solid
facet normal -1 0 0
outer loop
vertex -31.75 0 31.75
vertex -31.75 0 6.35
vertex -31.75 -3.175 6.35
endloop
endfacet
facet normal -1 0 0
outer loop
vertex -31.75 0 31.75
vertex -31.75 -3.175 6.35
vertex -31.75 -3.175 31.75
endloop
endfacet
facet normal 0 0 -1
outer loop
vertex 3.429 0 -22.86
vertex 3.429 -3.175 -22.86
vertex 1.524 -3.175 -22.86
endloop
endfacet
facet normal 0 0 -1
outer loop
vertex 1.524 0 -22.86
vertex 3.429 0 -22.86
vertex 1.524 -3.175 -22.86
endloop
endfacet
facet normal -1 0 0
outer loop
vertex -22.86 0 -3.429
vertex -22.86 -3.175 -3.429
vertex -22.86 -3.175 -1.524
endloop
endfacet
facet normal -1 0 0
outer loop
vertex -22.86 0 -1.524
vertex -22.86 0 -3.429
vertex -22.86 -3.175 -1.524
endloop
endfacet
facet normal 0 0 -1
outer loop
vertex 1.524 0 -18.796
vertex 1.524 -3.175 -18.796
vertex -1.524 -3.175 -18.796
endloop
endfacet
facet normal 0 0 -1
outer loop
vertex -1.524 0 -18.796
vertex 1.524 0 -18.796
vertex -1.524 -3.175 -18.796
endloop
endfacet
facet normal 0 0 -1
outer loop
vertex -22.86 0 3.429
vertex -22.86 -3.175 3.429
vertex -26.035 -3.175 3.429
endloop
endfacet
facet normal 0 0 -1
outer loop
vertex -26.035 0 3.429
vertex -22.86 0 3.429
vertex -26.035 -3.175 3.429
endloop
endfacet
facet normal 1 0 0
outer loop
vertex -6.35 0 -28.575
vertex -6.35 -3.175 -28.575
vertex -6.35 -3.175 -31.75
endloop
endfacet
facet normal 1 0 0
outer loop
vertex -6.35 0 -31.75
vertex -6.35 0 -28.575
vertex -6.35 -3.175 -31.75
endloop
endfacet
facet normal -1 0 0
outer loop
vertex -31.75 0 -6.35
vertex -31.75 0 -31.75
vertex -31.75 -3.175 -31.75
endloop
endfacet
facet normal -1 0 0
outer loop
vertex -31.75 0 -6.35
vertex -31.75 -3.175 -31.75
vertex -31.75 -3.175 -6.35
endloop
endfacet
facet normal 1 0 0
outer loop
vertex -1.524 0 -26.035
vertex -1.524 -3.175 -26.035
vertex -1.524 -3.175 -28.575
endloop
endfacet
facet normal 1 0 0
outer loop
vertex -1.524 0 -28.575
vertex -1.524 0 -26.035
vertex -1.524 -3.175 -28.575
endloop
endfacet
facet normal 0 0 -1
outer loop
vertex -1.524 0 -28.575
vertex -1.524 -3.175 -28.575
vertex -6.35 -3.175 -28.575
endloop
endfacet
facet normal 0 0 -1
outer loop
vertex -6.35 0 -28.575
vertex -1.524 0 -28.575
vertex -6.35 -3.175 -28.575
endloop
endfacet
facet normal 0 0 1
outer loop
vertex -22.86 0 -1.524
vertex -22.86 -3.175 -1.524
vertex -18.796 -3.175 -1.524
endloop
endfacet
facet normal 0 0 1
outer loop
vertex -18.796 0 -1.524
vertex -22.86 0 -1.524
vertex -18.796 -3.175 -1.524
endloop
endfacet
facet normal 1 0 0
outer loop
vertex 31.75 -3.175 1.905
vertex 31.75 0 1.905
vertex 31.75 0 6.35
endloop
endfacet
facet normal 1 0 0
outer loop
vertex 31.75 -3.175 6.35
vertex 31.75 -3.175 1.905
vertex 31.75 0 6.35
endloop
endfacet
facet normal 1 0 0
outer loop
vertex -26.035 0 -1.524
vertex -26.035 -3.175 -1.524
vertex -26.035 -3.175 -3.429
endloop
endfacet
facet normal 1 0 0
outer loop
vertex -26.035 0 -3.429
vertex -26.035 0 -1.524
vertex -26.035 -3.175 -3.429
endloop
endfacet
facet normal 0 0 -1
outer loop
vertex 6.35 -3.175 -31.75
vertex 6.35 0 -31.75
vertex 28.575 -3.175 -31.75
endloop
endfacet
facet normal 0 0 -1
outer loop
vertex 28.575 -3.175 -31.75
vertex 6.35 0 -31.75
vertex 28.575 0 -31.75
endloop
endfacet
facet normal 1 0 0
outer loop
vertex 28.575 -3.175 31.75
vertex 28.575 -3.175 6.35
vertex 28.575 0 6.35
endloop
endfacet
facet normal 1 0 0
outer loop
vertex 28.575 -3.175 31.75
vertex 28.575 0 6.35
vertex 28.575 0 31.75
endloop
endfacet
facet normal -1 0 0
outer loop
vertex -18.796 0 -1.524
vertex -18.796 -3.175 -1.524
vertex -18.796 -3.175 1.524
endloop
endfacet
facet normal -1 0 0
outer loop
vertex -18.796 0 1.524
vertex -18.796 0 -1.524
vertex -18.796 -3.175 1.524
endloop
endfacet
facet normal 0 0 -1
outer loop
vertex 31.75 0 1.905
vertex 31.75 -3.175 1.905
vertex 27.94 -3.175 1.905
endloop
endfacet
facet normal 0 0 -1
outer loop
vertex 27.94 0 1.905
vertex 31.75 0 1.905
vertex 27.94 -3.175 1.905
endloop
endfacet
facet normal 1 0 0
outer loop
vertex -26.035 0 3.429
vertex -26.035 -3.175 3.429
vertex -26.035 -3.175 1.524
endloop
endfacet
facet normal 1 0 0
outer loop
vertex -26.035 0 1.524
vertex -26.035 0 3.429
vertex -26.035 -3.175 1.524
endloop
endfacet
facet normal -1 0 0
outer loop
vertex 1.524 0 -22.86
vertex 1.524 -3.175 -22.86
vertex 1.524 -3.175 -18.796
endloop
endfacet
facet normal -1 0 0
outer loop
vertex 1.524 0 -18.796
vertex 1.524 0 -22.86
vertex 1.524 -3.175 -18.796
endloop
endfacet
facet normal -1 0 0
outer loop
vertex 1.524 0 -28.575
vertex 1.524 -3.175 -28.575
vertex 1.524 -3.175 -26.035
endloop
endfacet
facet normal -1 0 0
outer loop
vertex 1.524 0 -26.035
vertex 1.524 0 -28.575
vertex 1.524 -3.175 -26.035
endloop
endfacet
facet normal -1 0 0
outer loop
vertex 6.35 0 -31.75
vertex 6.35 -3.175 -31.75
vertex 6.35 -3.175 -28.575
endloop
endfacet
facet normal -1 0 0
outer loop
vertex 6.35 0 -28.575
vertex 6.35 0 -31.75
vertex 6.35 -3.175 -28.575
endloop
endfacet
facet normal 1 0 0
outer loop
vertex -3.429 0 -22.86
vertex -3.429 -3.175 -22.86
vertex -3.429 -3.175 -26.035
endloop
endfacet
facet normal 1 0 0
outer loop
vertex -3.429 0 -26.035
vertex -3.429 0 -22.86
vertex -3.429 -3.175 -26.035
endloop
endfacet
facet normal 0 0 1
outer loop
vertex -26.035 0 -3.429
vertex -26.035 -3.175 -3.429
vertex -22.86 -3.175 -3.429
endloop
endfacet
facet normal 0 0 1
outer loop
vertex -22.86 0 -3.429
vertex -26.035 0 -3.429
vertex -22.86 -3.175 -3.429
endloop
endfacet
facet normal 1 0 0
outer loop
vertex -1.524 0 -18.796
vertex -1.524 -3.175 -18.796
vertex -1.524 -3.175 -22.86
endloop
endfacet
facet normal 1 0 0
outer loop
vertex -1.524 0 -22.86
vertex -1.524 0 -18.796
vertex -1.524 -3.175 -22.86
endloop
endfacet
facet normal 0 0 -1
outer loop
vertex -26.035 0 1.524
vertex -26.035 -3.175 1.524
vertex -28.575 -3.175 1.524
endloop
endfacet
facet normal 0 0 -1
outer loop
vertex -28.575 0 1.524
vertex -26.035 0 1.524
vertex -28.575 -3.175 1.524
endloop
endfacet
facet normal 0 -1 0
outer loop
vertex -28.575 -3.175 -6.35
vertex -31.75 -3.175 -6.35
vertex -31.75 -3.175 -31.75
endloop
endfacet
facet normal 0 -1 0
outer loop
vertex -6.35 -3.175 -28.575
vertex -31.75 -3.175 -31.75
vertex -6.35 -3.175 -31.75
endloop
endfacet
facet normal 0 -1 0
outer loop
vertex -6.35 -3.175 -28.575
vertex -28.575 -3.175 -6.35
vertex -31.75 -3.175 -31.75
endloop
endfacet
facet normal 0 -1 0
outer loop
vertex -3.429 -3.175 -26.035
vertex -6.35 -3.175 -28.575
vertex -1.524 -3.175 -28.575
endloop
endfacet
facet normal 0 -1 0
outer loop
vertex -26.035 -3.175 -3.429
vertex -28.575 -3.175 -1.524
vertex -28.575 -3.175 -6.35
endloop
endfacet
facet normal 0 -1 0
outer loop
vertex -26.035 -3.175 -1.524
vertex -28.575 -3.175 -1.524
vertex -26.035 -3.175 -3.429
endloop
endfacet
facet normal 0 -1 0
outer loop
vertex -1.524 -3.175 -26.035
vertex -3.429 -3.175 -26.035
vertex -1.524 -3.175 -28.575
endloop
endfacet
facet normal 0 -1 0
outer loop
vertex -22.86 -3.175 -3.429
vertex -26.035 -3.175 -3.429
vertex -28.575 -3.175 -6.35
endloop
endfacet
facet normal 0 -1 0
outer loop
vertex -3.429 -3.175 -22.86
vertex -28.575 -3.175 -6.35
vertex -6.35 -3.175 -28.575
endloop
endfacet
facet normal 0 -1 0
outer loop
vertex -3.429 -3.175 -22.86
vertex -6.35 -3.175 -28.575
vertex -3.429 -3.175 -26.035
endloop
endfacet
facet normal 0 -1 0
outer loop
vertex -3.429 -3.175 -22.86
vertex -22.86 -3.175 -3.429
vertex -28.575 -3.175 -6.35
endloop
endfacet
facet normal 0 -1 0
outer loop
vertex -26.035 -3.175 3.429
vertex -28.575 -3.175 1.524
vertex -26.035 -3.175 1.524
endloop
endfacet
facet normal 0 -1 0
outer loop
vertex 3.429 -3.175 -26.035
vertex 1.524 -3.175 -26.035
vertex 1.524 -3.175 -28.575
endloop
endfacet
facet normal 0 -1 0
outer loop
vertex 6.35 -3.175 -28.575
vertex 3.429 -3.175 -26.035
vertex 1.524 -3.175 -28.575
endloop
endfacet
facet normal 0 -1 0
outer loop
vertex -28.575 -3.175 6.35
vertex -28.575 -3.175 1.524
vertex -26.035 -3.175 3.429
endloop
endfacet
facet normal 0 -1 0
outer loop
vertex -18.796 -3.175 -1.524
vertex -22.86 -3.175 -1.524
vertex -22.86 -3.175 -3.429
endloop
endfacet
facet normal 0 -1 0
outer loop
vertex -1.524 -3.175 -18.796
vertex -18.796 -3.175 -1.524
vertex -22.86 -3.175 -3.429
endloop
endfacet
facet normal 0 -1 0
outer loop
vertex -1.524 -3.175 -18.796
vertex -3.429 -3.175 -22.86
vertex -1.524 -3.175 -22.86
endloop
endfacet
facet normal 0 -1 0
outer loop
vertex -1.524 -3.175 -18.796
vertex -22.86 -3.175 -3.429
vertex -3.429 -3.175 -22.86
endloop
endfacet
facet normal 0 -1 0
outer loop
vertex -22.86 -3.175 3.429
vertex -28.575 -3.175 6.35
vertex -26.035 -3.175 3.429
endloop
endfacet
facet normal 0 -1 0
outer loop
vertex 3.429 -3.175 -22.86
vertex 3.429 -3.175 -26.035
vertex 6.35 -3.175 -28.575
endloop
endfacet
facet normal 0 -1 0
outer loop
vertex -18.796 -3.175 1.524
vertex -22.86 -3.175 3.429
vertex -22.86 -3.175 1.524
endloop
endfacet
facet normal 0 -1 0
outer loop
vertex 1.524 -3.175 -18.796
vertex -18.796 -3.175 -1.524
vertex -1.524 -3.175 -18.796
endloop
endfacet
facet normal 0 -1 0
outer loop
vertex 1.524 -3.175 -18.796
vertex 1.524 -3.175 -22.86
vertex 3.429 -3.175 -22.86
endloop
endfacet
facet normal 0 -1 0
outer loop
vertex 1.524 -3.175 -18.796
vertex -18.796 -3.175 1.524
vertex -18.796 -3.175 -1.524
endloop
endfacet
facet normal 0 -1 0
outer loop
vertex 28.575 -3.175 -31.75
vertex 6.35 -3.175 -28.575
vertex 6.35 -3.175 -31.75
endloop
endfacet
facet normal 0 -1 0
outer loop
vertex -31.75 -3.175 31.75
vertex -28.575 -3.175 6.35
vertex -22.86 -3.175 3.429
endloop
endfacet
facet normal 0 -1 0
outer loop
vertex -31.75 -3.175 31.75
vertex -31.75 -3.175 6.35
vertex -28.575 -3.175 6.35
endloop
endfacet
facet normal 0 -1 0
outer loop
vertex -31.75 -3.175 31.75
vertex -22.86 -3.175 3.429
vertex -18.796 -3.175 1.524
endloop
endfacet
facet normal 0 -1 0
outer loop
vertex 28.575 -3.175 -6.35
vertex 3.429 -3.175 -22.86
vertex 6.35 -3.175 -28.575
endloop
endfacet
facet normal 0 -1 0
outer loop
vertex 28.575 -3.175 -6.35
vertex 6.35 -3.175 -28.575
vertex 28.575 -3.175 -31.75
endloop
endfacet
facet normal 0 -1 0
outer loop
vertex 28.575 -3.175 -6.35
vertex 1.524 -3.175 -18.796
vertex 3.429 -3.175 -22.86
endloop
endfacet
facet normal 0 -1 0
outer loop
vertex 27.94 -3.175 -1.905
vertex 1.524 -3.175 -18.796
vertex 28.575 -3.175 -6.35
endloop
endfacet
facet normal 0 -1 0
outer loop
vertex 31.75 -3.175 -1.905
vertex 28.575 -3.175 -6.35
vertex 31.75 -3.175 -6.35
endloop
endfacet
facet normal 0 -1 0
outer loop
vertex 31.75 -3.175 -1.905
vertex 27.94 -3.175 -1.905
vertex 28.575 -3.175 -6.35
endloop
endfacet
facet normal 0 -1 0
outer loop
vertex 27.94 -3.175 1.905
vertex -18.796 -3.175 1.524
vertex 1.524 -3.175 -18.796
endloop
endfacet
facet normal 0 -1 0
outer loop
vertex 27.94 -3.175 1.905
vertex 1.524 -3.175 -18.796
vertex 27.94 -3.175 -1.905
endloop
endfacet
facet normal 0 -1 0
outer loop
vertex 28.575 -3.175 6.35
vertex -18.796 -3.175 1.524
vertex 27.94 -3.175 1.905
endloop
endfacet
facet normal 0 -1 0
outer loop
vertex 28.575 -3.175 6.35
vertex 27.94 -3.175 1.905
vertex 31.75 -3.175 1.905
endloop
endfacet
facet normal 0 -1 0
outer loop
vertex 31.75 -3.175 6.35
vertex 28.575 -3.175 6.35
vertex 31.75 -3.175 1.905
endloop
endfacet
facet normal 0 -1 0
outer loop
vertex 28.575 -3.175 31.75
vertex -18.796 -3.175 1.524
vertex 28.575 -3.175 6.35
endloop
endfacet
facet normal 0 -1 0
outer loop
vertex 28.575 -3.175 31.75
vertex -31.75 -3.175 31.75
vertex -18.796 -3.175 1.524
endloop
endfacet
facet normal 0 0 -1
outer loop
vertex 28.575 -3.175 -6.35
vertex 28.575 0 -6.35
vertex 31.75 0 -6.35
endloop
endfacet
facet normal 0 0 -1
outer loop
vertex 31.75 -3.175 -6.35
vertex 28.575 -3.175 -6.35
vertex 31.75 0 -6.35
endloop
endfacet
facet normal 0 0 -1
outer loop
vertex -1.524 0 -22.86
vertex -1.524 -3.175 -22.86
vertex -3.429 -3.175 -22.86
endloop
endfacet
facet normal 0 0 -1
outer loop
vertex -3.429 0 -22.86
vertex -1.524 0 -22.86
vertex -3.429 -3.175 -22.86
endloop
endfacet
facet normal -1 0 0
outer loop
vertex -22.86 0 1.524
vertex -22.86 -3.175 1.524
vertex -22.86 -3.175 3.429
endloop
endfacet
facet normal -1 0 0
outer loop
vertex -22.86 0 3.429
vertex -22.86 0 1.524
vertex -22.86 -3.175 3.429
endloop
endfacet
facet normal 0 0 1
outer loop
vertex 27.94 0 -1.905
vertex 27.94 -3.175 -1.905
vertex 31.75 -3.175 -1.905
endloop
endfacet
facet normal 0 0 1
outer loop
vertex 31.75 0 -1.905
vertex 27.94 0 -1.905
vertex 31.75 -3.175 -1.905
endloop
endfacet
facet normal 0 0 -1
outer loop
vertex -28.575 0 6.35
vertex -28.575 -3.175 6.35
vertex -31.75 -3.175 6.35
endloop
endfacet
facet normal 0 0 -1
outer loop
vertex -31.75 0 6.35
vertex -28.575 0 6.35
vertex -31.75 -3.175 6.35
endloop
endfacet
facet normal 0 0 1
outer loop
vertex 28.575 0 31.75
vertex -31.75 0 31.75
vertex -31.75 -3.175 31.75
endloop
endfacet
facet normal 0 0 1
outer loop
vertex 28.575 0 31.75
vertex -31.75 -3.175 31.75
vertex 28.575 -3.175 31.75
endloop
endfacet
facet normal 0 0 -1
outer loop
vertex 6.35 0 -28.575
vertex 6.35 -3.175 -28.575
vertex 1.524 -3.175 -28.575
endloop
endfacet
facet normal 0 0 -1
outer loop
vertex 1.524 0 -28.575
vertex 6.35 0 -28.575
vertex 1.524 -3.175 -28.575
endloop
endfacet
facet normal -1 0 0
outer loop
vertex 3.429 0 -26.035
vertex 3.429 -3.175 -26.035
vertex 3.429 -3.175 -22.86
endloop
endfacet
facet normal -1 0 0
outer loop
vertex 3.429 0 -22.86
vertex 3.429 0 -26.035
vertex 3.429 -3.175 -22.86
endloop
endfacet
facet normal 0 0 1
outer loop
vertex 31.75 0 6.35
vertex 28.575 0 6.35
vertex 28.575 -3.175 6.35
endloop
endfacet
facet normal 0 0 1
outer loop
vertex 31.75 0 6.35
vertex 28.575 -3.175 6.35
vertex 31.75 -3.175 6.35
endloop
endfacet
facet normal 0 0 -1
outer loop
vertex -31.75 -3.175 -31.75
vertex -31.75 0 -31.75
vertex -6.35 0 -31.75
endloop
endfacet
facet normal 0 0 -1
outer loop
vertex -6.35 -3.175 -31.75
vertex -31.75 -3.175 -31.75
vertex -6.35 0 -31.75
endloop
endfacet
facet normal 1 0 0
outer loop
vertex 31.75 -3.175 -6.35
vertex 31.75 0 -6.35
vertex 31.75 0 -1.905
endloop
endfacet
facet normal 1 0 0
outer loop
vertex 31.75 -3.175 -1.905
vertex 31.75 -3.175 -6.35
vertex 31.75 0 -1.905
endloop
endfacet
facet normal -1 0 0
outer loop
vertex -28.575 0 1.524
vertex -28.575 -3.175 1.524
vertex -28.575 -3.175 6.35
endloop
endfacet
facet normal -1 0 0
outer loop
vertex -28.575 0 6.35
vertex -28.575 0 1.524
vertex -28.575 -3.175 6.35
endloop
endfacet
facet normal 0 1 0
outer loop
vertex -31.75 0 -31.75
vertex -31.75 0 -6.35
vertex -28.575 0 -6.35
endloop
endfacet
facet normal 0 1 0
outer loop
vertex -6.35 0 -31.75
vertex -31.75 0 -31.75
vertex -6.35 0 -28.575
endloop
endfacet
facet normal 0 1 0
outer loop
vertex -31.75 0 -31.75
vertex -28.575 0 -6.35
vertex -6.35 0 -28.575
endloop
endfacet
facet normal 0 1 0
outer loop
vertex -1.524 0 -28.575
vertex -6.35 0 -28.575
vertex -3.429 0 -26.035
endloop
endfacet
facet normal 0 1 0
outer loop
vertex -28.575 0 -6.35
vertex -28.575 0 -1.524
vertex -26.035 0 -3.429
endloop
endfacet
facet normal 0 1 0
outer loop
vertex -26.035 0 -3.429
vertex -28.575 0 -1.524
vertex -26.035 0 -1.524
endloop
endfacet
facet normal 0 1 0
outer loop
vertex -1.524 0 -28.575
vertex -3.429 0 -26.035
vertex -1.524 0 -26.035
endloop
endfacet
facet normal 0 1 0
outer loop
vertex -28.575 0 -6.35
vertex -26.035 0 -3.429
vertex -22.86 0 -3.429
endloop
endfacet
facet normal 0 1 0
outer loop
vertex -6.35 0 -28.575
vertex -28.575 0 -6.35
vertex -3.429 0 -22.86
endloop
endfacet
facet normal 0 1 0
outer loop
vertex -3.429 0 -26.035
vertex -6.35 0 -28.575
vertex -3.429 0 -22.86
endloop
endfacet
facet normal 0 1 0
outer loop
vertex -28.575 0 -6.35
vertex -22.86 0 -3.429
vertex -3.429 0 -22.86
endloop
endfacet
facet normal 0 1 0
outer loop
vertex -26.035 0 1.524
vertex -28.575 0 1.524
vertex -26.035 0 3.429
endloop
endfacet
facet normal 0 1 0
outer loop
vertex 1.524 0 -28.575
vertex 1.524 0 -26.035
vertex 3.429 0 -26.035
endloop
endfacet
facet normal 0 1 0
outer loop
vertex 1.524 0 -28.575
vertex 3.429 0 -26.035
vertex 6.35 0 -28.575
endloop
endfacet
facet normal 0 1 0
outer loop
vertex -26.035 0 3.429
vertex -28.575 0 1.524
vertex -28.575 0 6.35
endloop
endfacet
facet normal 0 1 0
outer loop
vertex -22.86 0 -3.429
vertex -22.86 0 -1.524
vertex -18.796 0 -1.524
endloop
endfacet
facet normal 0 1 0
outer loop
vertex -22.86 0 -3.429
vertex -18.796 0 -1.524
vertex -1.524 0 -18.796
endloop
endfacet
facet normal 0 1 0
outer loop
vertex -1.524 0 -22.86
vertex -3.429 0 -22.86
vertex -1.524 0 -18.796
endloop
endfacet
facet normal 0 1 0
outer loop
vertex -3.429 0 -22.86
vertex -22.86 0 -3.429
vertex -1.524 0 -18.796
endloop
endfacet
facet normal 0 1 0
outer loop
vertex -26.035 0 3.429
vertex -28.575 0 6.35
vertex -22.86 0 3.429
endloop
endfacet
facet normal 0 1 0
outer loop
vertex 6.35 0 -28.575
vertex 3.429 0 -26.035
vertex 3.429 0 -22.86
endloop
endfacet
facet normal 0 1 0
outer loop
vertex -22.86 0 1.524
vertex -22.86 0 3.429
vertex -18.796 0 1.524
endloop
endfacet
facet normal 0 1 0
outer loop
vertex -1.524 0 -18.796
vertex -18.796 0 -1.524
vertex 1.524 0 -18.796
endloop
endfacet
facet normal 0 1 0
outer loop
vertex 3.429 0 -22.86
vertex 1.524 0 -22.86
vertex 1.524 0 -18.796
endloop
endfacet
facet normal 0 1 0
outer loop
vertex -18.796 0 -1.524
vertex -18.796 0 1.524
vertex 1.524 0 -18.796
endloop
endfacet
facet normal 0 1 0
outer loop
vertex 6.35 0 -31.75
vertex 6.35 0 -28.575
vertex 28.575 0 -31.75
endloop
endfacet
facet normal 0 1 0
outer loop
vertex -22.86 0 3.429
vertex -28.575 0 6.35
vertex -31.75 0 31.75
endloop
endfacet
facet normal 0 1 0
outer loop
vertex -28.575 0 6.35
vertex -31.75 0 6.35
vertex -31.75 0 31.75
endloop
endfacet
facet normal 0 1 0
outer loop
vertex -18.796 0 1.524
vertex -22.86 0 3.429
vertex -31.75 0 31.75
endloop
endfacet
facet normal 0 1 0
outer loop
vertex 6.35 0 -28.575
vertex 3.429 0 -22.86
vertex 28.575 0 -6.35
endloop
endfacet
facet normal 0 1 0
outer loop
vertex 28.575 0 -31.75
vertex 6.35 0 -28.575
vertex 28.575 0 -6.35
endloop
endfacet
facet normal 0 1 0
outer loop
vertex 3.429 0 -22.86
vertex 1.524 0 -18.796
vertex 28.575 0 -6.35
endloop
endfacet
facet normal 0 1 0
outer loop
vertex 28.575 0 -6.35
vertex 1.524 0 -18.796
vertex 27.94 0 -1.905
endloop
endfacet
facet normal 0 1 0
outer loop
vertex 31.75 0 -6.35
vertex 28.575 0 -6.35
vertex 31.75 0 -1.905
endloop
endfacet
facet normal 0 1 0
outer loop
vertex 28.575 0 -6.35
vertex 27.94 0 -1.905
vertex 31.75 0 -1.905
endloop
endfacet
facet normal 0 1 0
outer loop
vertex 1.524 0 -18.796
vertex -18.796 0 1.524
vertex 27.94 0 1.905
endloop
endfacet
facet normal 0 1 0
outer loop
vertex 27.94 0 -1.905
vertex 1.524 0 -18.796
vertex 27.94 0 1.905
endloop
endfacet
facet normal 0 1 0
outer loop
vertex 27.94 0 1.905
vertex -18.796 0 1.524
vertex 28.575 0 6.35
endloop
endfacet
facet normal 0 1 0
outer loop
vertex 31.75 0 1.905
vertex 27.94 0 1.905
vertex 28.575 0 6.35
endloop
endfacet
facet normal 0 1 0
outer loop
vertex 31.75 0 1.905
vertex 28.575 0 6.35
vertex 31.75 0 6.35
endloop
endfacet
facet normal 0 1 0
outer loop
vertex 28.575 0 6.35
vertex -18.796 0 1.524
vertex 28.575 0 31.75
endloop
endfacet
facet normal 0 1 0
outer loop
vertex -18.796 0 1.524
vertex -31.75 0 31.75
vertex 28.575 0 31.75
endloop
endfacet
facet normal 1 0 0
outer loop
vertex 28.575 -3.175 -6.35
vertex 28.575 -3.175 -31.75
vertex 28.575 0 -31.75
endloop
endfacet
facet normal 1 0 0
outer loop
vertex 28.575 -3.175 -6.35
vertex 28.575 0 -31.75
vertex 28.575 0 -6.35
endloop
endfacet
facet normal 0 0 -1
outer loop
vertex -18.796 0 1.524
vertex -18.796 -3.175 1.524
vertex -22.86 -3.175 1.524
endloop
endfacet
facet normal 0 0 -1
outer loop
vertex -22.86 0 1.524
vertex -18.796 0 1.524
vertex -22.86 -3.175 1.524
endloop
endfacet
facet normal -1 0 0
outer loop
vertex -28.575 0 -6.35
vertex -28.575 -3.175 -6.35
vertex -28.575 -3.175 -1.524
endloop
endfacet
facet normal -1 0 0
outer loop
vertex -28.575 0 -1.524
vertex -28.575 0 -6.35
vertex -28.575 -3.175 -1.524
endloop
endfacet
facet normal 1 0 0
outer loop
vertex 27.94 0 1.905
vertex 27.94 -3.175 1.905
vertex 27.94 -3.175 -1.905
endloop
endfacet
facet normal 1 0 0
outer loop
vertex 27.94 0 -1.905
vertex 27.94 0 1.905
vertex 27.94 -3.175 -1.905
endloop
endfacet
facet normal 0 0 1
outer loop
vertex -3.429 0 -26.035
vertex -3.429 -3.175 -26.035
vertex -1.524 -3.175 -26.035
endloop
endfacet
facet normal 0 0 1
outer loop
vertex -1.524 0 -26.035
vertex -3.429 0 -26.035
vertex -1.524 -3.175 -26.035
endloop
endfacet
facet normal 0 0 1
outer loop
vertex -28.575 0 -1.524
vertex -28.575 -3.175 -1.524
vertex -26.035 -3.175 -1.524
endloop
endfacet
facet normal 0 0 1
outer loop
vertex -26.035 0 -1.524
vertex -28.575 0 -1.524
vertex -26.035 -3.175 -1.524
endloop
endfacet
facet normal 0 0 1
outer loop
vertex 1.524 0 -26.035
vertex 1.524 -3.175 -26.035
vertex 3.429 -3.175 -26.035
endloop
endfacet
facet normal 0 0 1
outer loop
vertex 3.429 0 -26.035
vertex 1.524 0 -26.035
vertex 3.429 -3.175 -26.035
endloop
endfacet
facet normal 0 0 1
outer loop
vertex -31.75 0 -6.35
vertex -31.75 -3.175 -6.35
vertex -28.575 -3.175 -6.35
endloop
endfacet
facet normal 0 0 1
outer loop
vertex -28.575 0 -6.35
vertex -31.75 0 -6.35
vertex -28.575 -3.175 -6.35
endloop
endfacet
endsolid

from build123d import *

# Parameters (mm, degrees)
F0_W     = 63.5
F0_H     = 63.5
F1_DEPTH = 3.175
F2_W     = 3.175
F2_H     = 25.4
F3_DEPTH = 25.4


with BuildPart() as f1:
    # F0 (on Front) → F1 (new body)
    with BuildSketch(Plane.XZ):
        Rectangle(F0_W, F0_H)
    extrude(amount=F1_DEPTH)

    # F2 (on face) → F3 (cut)
    with BuildSketch(Plane.XZ.offset(3.175)):
        with Locations((30.1625, 19.05)):
            Rectangle(F2_W, F2_H)
        with Locations((30.1625, -19.05)):
            Rectangle(F2_W, F2_H)
        Polygon((31.75, 1.905), (27.94, 1.905), (27.94, -1.905), (31.75, -1.905), (31.75, 0), align=None)
        Polygon((-6.35, -31.75), (0, -31.75), (6.35, -31.75), (6.35, -28.575), (1.524, -28.575), (1.524, -26.035), (3.429, -26.035), (3.429, -22.86), (1.524, -22.86), (1.524, -18.796), (0, -18.796), (-1.524, -18.796), (-1.524, -22.86), (-3.429, -22.86), (-3.429, -26.035), (-1.524, -26.035), (-1.524, -28.575), (-6.35, -28.575), align=None)
        Polygon((-31.75, 6.35), (-31.75, 0), (-31.75, -6.35), (-28.575, -6.35), (-28.575, -1.524), (-26.035, -1.524), (-26.035, -3.429), (-22.86, -3.429), (-22.86, -1.524), (-18.796, -1.524), (-18.796, 0), (-18.796, 1.524), (-22.86, 1.524), (-22.86, 3.429), (-26.035, 3.429), (-26.035, 1.524), (-28.575, 1.524), (-28.575, 6.35), align=None)
    extrude(amount=-F3_DEPTH, mode=Mode.SUBTRACT)


solid = f1.part
